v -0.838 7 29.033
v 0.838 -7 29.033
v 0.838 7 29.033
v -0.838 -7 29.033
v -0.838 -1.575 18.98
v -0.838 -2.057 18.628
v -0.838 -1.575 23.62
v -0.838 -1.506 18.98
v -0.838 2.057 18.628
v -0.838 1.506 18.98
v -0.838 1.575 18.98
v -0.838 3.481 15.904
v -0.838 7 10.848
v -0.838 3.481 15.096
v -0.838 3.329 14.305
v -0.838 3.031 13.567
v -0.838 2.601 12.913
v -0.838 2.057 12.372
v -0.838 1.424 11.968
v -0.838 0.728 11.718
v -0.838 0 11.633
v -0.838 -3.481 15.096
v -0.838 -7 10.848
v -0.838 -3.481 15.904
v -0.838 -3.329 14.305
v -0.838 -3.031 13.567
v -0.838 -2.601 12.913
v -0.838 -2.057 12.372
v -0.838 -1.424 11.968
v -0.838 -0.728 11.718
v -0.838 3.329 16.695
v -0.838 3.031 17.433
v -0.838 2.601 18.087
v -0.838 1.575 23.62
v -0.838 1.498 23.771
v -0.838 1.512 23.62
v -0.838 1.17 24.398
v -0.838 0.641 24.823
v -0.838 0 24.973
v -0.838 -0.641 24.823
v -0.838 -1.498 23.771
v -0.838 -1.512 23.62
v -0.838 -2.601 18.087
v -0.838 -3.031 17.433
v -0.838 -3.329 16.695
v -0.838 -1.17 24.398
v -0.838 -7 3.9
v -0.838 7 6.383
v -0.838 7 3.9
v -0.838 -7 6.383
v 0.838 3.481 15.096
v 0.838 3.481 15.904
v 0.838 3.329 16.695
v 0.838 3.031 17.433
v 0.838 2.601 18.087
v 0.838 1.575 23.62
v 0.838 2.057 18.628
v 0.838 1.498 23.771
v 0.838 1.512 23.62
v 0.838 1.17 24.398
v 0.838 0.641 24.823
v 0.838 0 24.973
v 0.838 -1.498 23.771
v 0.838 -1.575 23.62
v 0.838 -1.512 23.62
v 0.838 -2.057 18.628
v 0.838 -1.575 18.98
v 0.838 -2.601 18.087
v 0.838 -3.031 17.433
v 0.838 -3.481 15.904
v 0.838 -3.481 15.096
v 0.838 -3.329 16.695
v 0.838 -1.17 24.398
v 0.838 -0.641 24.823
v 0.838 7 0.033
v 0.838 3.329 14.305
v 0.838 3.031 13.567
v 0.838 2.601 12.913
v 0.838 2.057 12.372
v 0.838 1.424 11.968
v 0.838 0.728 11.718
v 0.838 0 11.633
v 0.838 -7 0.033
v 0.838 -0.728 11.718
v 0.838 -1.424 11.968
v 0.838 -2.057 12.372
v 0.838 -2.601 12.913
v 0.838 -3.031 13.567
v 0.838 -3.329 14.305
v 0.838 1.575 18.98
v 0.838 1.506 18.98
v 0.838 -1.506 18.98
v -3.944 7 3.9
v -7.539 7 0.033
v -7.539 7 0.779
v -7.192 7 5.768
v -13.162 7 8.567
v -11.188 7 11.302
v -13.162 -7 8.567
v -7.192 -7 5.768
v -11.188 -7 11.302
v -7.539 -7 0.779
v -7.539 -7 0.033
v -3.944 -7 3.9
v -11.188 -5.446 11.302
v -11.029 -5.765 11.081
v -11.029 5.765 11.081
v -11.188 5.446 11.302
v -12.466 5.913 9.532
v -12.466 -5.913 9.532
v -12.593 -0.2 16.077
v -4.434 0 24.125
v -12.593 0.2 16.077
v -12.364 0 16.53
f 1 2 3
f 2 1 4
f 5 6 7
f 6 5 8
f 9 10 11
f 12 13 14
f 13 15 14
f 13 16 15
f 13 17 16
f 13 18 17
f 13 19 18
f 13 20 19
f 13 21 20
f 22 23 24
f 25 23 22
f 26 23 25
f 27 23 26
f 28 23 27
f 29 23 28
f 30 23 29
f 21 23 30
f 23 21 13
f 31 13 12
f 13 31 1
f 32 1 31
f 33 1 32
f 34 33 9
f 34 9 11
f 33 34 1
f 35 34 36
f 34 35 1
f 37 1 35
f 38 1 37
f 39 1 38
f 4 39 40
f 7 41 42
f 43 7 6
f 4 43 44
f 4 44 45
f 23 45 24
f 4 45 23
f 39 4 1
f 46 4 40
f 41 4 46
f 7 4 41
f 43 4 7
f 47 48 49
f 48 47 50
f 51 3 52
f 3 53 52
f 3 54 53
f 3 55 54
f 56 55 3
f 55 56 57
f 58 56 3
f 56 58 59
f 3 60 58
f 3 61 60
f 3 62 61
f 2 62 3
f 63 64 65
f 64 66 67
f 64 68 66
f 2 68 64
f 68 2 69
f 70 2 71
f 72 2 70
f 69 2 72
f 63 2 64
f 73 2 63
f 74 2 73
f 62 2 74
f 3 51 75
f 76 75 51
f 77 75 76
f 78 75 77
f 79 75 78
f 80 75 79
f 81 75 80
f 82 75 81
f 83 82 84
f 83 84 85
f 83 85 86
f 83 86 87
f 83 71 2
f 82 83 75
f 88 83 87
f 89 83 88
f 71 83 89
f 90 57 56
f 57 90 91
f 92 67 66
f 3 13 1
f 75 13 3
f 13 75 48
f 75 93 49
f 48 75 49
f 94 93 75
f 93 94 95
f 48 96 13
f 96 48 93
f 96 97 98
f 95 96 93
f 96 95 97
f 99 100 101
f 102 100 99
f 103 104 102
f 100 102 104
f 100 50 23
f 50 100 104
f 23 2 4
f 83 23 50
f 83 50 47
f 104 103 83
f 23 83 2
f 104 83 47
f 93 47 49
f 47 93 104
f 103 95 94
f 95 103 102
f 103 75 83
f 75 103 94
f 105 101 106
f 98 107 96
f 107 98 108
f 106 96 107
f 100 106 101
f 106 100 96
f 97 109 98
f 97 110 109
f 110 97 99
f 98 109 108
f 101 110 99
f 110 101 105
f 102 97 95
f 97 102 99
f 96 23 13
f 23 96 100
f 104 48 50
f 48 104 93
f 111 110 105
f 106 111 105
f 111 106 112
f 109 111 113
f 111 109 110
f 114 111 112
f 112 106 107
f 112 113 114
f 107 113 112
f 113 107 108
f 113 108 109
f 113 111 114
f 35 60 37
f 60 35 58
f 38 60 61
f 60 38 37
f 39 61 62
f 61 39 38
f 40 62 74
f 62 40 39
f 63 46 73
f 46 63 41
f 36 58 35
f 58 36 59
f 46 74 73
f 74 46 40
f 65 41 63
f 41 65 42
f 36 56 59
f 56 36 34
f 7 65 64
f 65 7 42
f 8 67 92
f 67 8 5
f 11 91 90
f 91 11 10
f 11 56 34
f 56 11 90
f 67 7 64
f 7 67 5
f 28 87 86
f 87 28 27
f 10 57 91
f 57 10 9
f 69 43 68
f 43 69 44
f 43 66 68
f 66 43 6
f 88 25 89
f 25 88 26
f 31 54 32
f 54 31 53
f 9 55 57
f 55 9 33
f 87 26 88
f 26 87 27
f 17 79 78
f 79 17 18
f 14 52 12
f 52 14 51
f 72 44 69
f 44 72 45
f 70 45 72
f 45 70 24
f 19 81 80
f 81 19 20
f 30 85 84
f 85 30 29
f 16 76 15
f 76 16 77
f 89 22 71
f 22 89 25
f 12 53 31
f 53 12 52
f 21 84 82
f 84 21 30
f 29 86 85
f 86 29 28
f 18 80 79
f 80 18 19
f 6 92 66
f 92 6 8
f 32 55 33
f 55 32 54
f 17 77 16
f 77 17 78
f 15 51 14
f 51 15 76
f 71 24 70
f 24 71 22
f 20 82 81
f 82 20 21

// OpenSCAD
// globals
co_radius = 40;
co_height = 10;
tab_width = 40;
tab_thickness = 10;
base_thickness = 6;

module screwHole() {
  module narrowHole() {
    module head() {
      translate([20,0,0])
        cylinder(r=4.5, h=base_thickness*1.1, center=true);
    }

    module body() {
      translate([15,0,0])
        cube([12,9,base_thickness*1.1], center=true);
    }

    head();
    body();
  }

  module wideHole() {
   cylinder(r=10, h=base_thickness*1.1, center=true);
  }

  narrowHole();
  wideHole();
}

module hook() {
  module supportTab() {
    cube([70, tab_width, base_thickness], center=true);
  }

  module baseTab() {
    translate([-35, 0, 12])
     cube([tab_thickness, tab_width, 30], center=true);
  }

  module inclinedTab() {
    translate([-25, 0, 33])
      rotate([0, 45, 0])
        cube([tab_thickness, tab_width, 30], center=true);
  }
  
  module bridgeTab() {
	translate([-23, 0, 12])
      rotate([0, -30, 0])
        cube([tab_thickness, tab_width, 28], center=true);
  }

  module tip() {
    translate([-5, 0, 35])
      rotate([0, 35, 0])
        resize([50, 40, 12])
          cylinder(r1=35, r2=1, h=tab_thickness*.75, $fn=3);
  }
  
  supportTab();
  baseTab();
  inclinedTab();
  bridgeTab();
  tip();
}

module screwHook() {
  difference() {
    union() { hook(); }
	union() { screwHole(); }
  }
}

module screwHookDesign() {
  rotate([0, 270, 0])
    translate([15.5,0,0])
      resize([29,14,14])
        screwHook();
}

screwHookDesign();

// include this file with
// include <screwhook/hook.scad>
// resize([0,10,10]) cylinder(h=10, r=20, center=true, $fn=3);
